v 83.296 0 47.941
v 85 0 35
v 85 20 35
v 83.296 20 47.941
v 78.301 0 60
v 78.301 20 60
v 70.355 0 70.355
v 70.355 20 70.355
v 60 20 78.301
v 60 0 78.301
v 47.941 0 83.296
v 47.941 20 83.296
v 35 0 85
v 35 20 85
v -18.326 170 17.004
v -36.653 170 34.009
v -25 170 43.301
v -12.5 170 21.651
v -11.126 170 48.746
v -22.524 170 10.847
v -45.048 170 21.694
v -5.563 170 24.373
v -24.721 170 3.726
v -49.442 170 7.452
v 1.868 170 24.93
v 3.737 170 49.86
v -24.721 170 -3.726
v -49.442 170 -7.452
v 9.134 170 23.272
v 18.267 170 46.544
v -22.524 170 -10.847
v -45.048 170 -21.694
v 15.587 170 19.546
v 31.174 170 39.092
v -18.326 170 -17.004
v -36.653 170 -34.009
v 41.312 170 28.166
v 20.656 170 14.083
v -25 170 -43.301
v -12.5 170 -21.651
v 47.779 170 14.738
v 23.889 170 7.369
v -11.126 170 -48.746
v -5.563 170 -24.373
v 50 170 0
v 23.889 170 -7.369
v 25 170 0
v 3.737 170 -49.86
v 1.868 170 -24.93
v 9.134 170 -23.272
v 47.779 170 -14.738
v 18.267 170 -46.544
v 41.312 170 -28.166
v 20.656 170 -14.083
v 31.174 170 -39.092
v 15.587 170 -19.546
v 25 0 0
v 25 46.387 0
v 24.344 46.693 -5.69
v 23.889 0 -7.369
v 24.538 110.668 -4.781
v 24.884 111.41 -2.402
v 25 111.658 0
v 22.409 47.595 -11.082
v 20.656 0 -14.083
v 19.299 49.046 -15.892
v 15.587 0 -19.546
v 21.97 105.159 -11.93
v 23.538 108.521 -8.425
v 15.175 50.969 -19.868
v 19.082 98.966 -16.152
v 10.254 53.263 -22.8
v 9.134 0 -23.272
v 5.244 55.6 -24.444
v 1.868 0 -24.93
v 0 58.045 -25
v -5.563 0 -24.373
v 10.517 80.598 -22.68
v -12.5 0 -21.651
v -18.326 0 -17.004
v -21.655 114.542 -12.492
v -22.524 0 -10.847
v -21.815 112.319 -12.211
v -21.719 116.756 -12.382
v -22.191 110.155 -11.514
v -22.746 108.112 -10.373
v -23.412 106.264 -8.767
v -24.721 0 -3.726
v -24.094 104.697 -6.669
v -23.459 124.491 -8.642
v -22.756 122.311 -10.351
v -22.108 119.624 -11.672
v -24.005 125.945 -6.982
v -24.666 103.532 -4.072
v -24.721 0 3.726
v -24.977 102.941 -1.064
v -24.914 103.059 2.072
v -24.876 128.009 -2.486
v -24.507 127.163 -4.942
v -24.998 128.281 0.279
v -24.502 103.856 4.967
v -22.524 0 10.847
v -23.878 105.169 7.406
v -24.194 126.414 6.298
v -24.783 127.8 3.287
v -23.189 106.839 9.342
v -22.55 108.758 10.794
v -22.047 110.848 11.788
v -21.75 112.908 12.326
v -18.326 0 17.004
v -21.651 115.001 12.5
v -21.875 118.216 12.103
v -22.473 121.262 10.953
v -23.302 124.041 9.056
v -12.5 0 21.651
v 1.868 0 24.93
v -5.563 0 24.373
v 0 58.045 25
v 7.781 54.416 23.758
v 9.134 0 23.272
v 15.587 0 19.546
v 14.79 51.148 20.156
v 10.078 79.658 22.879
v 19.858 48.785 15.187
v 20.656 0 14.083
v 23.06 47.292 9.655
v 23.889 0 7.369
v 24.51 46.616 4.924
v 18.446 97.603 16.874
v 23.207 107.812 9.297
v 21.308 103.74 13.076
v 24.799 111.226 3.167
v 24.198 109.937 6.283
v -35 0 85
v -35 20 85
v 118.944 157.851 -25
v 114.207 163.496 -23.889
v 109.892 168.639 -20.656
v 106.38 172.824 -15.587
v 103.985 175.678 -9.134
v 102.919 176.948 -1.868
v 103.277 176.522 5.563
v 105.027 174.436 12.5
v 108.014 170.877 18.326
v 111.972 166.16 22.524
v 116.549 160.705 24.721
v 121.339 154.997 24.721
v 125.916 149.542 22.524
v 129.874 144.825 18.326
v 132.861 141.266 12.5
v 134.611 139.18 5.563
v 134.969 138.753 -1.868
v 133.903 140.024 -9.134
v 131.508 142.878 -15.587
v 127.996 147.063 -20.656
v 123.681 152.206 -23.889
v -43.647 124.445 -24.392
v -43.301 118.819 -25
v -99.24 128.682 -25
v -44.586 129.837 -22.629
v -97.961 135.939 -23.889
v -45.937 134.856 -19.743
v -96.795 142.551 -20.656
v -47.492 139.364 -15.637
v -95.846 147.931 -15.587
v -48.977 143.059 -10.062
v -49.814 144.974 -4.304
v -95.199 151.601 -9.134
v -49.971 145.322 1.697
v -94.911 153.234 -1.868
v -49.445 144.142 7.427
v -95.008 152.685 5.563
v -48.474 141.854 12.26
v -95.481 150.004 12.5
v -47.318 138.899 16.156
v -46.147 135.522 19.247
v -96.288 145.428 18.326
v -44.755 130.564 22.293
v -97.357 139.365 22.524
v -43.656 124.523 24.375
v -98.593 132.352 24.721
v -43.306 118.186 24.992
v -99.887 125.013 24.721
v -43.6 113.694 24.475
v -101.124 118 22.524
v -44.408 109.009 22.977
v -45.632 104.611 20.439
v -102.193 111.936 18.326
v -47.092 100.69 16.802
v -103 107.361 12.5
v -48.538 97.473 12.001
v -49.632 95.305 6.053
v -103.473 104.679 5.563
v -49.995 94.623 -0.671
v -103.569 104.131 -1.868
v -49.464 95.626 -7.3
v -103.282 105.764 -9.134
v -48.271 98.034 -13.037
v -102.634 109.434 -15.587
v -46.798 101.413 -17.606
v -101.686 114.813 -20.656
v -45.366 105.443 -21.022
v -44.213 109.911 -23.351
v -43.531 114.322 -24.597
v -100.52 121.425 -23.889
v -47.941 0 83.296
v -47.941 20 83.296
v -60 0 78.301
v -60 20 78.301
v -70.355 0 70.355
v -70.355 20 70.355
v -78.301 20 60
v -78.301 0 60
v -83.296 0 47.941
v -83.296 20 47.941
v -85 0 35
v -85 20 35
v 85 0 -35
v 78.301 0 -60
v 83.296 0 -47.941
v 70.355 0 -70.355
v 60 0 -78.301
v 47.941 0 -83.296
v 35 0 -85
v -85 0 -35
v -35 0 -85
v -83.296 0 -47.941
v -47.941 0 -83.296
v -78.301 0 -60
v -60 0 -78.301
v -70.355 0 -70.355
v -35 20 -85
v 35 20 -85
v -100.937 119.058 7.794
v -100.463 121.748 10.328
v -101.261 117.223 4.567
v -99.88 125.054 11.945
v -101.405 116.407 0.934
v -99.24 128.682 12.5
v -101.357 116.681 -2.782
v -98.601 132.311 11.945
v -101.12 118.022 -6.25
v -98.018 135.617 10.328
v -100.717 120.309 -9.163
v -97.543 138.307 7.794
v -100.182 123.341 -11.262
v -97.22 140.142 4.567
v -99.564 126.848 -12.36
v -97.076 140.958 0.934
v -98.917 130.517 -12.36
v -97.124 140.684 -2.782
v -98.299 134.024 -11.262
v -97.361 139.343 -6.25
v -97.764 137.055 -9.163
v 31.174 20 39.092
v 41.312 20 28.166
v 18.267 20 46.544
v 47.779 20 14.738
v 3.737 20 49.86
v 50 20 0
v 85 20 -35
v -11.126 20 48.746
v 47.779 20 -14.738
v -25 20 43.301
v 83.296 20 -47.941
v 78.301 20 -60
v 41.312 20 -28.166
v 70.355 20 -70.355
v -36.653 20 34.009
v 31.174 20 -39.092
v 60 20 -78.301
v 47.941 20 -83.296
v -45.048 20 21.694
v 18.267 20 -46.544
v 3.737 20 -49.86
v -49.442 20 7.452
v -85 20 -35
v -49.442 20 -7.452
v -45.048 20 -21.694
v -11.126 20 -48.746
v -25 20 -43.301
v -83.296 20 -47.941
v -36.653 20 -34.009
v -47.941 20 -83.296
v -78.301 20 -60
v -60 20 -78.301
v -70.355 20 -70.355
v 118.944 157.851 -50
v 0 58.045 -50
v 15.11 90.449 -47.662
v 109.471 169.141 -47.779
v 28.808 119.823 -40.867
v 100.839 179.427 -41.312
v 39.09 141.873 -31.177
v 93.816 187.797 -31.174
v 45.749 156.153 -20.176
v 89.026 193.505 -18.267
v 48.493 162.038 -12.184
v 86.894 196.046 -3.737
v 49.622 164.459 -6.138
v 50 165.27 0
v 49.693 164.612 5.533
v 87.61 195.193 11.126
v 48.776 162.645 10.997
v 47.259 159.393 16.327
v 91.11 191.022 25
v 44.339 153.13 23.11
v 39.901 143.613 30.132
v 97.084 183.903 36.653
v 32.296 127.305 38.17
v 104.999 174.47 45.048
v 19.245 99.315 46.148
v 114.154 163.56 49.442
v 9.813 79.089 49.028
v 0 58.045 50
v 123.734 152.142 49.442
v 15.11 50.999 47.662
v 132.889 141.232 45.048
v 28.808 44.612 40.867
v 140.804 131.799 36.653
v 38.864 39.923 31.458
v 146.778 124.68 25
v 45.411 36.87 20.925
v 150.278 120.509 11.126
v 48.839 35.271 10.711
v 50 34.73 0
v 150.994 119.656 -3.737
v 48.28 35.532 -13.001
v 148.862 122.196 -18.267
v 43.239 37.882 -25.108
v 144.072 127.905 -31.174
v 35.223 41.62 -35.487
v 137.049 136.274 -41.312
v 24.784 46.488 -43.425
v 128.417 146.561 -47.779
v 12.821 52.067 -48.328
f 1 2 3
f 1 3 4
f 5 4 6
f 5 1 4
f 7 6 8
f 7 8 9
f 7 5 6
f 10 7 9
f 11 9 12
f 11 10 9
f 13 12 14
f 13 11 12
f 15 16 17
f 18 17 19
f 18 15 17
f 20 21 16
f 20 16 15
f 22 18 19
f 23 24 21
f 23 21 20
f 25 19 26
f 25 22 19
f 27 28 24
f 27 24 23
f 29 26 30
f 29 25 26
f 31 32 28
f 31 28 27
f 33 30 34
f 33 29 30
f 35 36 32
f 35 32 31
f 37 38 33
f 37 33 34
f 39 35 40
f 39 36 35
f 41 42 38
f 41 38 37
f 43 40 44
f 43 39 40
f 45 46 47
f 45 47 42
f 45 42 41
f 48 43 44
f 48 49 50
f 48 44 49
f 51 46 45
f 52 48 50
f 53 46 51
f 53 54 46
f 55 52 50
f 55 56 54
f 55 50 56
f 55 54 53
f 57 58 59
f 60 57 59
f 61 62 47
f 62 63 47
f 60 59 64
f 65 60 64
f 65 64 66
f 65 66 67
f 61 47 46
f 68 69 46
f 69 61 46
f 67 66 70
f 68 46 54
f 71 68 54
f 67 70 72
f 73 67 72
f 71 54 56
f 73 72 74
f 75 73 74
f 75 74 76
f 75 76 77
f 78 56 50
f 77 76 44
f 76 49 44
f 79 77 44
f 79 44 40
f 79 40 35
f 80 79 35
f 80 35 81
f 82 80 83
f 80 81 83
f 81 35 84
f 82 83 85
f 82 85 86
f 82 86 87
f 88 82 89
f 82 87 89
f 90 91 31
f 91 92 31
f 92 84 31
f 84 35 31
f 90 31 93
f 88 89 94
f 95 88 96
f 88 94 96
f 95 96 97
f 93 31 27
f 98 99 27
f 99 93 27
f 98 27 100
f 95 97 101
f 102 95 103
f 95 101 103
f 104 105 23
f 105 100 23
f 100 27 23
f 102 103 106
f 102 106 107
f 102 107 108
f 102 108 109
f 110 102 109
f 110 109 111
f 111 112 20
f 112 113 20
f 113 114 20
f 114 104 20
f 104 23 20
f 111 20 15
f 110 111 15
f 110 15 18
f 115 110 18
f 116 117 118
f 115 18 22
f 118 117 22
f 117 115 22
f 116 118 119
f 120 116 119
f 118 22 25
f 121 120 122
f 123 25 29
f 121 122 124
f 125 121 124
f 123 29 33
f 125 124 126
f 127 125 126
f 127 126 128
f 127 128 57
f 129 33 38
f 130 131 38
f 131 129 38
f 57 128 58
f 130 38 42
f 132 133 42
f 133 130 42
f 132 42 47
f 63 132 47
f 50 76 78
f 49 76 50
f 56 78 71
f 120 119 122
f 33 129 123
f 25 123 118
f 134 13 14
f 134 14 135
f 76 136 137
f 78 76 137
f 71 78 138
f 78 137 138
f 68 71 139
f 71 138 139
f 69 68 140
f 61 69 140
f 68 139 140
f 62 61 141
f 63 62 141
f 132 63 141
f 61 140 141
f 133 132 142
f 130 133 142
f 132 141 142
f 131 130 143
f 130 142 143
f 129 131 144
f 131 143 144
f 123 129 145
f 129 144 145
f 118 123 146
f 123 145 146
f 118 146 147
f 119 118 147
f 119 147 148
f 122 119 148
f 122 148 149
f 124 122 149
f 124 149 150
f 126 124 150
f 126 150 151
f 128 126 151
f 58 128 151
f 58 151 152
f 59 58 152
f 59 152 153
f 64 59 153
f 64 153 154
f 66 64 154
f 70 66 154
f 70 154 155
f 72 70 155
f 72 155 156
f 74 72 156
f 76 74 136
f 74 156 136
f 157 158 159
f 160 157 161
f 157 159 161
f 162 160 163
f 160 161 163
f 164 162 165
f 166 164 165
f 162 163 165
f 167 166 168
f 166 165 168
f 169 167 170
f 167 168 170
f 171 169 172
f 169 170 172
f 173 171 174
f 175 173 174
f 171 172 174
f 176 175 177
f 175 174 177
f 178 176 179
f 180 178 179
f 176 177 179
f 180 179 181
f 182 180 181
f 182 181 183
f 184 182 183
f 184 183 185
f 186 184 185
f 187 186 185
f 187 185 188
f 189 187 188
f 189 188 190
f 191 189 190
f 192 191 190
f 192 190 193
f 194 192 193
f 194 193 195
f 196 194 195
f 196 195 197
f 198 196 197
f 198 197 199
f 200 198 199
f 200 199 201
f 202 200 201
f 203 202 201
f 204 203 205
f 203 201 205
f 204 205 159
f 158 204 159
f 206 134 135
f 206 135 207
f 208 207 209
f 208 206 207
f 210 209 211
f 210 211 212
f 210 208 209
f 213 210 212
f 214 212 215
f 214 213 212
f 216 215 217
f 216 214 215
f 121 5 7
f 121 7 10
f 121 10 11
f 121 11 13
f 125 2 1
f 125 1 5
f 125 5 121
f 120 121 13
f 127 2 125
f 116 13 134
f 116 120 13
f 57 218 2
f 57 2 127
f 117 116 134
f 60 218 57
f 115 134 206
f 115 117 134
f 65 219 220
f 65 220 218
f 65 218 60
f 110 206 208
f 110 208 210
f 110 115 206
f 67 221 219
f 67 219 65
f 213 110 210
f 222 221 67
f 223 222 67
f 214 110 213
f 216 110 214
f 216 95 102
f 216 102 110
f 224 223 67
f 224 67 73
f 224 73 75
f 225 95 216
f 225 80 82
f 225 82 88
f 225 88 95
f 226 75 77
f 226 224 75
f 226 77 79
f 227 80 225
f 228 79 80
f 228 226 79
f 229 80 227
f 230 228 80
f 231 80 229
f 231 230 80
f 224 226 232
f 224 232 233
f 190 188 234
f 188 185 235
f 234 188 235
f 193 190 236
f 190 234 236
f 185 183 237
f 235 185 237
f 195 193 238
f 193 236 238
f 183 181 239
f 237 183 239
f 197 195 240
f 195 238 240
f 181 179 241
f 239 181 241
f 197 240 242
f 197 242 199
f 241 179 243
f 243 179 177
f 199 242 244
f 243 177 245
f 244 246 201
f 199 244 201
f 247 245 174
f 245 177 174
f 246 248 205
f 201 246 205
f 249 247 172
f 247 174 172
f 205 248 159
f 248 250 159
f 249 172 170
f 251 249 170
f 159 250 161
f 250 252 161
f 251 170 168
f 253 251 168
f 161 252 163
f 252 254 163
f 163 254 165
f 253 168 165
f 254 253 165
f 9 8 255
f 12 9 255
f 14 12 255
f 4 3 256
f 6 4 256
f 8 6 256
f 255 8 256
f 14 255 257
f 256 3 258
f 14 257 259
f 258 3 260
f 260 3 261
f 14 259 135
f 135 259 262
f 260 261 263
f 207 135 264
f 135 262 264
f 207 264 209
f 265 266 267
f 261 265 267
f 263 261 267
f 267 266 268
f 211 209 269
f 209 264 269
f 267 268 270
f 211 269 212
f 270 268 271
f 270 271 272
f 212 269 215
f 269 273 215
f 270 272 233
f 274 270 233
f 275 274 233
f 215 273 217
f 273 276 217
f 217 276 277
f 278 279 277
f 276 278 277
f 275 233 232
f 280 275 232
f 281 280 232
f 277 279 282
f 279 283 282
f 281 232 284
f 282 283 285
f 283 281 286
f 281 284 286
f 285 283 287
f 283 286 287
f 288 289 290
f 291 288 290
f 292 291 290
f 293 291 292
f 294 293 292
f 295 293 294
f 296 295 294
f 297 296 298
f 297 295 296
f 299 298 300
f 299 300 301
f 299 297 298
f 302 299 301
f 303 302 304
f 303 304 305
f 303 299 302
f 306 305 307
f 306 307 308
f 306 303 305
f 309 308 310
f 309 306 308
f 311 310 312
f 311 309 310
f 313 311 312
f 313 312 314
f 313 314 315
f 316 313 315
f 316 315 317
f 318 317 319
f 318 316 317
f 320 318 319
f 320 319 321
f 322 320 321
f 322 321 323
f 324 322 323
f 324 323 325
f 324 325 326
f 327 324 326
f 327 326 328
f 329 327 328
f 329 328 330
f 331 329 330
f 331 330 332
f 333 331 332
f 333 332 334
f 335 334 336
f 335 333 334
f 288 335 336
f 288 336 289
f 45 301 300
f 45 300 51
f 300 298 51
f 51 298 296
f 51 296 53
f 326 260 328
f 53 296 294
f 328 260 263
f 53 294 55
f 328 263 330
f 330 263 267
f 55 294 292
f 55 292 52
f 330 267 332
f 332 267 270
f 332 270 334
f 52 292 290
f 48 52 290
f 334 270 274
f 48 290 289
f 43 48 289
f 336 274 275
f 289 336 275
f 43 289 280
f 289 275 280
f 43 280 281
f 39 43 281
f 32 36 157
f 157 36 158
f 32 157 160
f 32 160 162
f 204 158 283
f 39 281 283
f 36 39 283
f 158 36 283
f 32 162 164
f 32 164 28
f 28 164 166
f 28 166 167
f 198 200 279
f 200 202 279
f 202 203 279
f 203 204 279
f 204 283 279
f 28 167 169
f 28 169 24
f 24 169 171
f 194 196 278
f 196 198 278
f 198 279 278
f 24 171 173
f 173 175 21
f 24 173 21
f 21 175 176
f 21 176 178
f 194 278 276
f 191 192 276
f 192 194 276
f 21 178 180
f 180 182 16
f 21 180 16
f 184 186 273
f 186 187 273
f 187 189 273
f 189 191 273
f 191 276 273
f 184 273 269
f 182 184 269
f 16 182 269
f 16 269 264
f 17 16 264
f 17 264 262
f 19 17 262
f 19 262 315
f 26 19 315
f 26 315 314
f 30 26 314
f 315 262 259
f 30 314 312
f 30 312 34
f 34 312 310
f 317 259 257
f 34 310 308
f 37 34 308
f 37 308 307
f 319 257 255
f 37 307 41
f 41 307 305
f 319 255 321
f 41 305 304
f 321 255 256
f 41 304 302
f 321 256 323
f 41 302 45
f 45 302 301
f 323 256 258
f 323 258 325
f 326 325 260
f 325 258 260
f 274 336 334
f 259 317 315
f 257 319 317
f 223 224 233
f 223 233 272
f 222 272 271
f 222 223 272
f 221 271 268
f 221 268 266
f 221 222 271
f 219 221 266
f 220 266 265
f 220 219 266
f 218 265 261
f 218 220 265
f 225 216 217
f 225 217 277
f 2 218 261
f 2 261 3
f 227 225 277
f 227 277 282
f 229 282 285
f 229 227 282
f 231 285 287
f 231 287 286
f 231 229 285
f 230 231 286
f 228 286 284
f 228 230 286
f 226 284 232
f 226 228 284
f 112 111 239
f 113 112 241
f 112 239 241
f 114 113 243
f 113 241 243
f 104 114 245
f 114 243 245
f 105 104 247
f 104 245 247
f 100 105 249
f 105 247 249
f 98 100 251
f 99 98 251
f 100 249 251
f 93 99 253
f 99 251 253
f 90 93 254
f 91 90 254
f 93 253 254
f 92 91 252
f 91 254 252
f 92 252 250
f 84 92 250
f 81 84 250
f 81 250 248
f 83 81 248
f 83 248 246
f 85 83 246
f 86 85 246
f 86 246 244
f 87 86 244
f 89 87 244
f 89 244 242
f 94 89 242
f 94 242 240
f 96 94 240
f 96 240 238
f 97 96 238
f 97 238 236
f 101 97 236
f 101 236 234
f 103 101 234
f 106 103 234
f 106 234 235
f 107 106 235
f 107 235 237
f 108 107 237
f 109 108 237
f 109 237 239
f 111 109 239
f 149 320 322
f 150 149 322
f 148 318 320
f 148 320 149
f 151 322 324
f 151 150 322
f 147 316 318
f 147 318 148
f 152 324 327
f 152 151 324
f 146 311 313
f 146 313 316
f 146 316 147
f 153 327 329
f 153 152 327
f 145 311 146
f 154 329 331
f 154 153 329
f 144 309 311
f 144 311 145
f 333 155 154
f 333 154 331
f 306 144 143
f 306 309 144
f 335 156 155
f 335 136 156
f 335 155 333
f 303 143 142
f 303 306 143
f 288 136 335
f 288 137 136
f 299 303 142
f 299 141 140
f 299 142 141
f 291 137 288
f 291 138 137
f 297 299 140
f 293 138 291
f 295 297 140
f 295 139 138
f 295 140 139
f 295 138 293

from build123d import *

# Parameters (mm, degrees)
BOSS_EXTRUDE1_DEPTH            = 20
SKETCH3_R                      = 50
BOSS_EXTRUDE2_DEPTH            = 150
SKETCH4_R                      = 25
CUT_EXTRUDE1_DEPTH             = 170
BOSS_EXTRUDE4_REACH            = 259.695
SKETCH6_R                      = 50
CUT_EXTRUDE2_REACH             = 259.695
SKETCH7_R                      = 25
CUT_EXTRUDE2_DIRECTION_2_DEPTH = 50.240387651
BOSS_EXTRUDE5_REACH            = 270.866
SKETCH9_R                      = 25
CUT_EXTRUDE3_REACH             = 270.866
SKETCH10_R                     = 12.5


with BuildPart() as part:
    # Sketch2 → Boss-Extrude1 (new body)
    with BuildSketch(Plane(origin=(0, 0, 0), x_dir=(1, 0, 0), z_dir=(0, 1, 0))):
        with BuildLine():
            Line((35, -85), (-35, -85))
            ThreePointArc((-35, -85), (-70.355339059, -70.355339059), (-85, -35))
            Line((-85, -35), (-85, 35))
            ThreePointArc((-85, 35), (-70.355339059, 70.355339059), (-35, 85))
            Line((-35, 85), (35, 85))
            ThreePointArc((35, 85), (70.355339059, 70.355339059), (85, 35))
            Line((85, 35), (85, -35))
            ThreePointArc((85, -35), (70.355339059, -70.355339059), (35, -85))
        make_face()
    extrude(amount=BOSS_EXTRUDE1_DEPTH)

    # Sketch3 → Boss-Extrude2 (add)
    with BuildSketch(Plane(origin=(0, 20, 0), x_dir=(1, 0, 0), z_dir=(0, 1, 0))):
        Circle(SKETCH3_R)
    extrude(amount=BOSS_EXTRUDE2_DEPTH)

    # Sketch4 → Cut-Extrude1 (cut)
    with BuildSketch(Plane(origin=(0, 170, 0), x_dir=(1, 0, 0), z_dir=(0, 1, 0))):
        Circle(SKETCH4_R)
    extrude(amount=-CUT_EXTRUDE1_DEPTH, mode=Mode.SUBTRACT)

    # Sketch6 → Boss-Extrude4 (add, up to next)
    with BuildSketch(Plane(origin=(147.525591973, 123.788669814, 0), x_dir=(0, 0, -1), z_dir=(0.766044443, 0.64278761, 0)), mode=Mode.PRIVATE) as boss_extrude4_sk1:
        with Locations((0, 44.465063828)):
            Circle(SKETCH6_R)
    boss_extrude4_tool1 = extrude(boss_extrude4_sk1.sketch, amount=-BOSS_EXTRUDE4_REACH, mode=Mode.PRIVATE) - part.part
    add(boss_extrude4_tool1.solids().sort_by_distance((118.944, 157.850885, 0))[0])

    # Sketch7 → Cut-Extrude2 (cut, up to next)
    with BuildSketch(Plane(origin=(147.525591973, 123.788669814, 0), x_dir=(0, 0, -1), z_dir=(0.766044443, 0.64278761, 0)), mode=Mode.PRIVATE) as cut_extrude2_sk1:
        with Locations((0, 44.465063828)):
            Circle(SKETCH7_R)
    cut_extrude2_tool1 = extrude(cut_extrude2_sk1.sketch, amount=-CUT_EXTRUDE2_REACH, mode=Mode.PRIVATE) & part.part
    add(cut_extrude2_tool1.solids().sort_by_distance((118.944, 157.850885, 0))[0], mode=Mode.SUBTRACT)

    # Sketch7 → Cut-Extrude2 direction 2 (cut)
    with BuildSketch(Plane(origin=(147.525591973, 123.788669814, 0), x_dir=(0, 0, -1), z_dir=(0.766044443, 0.64278761, 0))):
        with Locations((0, 44.465063828)):
            Circle(SKETCH7_R)
    extrude(amount=CUT_EXTRUDE2_DIRECTION_2_DEPTH, mode=Mode.SUBTRACT)

    # Sketch9 → Boss-Extrude5 (add, up to next)
    with BuildSketch(Plane(origin=(-118.25391177, 20.851355219, 0), x_dir=(0, 0, -1), z_dir=(0.984807753, -0.173648178, 0)), mode=Mode.PRIVATE) as boss_extrude5_sk1:
        with Locations((0, 109.494521478)):
            Circle(SKETCH9_R)
    boss_extrude5_tool1 = extrude(boss_extrude5_sk1.sketch, amount=BOSS_EXTRUDE5_REACH, mode=Mode.PRIVATE) - part.part
    add(boss_extrude5_tool1.solids().sort_by_distance((-99.240388, 128.682409, 0))[0])

    # Sketch10 → Cut-Extrude3 (cut, up to next)
    with BuildSketch(Plane(origin=(-118.25391177, 20.851355219, 0), x_dir=(0, 0, 1), z_dir=(-0.984807753, 0.173648178, 0)), mode=Mode.PRIVATE) as cut_extrude3_sk1:
        with Locations((0, 109.494521478)):
            Circle(SKETCH10_R)
    cut_extrude3_tool1 = extrude(cut_extrude3_sk1.sketch, amount=-CUT_EXTRUDE3_REACH, mode=Mode.PRIVATE) & part.part
    add(cut_extrude3_tool1.solids().sort_by_distance((-99.240388, 128.682409, 0))[0], mode=Mode.SUBTRACT)


solid = part.part
